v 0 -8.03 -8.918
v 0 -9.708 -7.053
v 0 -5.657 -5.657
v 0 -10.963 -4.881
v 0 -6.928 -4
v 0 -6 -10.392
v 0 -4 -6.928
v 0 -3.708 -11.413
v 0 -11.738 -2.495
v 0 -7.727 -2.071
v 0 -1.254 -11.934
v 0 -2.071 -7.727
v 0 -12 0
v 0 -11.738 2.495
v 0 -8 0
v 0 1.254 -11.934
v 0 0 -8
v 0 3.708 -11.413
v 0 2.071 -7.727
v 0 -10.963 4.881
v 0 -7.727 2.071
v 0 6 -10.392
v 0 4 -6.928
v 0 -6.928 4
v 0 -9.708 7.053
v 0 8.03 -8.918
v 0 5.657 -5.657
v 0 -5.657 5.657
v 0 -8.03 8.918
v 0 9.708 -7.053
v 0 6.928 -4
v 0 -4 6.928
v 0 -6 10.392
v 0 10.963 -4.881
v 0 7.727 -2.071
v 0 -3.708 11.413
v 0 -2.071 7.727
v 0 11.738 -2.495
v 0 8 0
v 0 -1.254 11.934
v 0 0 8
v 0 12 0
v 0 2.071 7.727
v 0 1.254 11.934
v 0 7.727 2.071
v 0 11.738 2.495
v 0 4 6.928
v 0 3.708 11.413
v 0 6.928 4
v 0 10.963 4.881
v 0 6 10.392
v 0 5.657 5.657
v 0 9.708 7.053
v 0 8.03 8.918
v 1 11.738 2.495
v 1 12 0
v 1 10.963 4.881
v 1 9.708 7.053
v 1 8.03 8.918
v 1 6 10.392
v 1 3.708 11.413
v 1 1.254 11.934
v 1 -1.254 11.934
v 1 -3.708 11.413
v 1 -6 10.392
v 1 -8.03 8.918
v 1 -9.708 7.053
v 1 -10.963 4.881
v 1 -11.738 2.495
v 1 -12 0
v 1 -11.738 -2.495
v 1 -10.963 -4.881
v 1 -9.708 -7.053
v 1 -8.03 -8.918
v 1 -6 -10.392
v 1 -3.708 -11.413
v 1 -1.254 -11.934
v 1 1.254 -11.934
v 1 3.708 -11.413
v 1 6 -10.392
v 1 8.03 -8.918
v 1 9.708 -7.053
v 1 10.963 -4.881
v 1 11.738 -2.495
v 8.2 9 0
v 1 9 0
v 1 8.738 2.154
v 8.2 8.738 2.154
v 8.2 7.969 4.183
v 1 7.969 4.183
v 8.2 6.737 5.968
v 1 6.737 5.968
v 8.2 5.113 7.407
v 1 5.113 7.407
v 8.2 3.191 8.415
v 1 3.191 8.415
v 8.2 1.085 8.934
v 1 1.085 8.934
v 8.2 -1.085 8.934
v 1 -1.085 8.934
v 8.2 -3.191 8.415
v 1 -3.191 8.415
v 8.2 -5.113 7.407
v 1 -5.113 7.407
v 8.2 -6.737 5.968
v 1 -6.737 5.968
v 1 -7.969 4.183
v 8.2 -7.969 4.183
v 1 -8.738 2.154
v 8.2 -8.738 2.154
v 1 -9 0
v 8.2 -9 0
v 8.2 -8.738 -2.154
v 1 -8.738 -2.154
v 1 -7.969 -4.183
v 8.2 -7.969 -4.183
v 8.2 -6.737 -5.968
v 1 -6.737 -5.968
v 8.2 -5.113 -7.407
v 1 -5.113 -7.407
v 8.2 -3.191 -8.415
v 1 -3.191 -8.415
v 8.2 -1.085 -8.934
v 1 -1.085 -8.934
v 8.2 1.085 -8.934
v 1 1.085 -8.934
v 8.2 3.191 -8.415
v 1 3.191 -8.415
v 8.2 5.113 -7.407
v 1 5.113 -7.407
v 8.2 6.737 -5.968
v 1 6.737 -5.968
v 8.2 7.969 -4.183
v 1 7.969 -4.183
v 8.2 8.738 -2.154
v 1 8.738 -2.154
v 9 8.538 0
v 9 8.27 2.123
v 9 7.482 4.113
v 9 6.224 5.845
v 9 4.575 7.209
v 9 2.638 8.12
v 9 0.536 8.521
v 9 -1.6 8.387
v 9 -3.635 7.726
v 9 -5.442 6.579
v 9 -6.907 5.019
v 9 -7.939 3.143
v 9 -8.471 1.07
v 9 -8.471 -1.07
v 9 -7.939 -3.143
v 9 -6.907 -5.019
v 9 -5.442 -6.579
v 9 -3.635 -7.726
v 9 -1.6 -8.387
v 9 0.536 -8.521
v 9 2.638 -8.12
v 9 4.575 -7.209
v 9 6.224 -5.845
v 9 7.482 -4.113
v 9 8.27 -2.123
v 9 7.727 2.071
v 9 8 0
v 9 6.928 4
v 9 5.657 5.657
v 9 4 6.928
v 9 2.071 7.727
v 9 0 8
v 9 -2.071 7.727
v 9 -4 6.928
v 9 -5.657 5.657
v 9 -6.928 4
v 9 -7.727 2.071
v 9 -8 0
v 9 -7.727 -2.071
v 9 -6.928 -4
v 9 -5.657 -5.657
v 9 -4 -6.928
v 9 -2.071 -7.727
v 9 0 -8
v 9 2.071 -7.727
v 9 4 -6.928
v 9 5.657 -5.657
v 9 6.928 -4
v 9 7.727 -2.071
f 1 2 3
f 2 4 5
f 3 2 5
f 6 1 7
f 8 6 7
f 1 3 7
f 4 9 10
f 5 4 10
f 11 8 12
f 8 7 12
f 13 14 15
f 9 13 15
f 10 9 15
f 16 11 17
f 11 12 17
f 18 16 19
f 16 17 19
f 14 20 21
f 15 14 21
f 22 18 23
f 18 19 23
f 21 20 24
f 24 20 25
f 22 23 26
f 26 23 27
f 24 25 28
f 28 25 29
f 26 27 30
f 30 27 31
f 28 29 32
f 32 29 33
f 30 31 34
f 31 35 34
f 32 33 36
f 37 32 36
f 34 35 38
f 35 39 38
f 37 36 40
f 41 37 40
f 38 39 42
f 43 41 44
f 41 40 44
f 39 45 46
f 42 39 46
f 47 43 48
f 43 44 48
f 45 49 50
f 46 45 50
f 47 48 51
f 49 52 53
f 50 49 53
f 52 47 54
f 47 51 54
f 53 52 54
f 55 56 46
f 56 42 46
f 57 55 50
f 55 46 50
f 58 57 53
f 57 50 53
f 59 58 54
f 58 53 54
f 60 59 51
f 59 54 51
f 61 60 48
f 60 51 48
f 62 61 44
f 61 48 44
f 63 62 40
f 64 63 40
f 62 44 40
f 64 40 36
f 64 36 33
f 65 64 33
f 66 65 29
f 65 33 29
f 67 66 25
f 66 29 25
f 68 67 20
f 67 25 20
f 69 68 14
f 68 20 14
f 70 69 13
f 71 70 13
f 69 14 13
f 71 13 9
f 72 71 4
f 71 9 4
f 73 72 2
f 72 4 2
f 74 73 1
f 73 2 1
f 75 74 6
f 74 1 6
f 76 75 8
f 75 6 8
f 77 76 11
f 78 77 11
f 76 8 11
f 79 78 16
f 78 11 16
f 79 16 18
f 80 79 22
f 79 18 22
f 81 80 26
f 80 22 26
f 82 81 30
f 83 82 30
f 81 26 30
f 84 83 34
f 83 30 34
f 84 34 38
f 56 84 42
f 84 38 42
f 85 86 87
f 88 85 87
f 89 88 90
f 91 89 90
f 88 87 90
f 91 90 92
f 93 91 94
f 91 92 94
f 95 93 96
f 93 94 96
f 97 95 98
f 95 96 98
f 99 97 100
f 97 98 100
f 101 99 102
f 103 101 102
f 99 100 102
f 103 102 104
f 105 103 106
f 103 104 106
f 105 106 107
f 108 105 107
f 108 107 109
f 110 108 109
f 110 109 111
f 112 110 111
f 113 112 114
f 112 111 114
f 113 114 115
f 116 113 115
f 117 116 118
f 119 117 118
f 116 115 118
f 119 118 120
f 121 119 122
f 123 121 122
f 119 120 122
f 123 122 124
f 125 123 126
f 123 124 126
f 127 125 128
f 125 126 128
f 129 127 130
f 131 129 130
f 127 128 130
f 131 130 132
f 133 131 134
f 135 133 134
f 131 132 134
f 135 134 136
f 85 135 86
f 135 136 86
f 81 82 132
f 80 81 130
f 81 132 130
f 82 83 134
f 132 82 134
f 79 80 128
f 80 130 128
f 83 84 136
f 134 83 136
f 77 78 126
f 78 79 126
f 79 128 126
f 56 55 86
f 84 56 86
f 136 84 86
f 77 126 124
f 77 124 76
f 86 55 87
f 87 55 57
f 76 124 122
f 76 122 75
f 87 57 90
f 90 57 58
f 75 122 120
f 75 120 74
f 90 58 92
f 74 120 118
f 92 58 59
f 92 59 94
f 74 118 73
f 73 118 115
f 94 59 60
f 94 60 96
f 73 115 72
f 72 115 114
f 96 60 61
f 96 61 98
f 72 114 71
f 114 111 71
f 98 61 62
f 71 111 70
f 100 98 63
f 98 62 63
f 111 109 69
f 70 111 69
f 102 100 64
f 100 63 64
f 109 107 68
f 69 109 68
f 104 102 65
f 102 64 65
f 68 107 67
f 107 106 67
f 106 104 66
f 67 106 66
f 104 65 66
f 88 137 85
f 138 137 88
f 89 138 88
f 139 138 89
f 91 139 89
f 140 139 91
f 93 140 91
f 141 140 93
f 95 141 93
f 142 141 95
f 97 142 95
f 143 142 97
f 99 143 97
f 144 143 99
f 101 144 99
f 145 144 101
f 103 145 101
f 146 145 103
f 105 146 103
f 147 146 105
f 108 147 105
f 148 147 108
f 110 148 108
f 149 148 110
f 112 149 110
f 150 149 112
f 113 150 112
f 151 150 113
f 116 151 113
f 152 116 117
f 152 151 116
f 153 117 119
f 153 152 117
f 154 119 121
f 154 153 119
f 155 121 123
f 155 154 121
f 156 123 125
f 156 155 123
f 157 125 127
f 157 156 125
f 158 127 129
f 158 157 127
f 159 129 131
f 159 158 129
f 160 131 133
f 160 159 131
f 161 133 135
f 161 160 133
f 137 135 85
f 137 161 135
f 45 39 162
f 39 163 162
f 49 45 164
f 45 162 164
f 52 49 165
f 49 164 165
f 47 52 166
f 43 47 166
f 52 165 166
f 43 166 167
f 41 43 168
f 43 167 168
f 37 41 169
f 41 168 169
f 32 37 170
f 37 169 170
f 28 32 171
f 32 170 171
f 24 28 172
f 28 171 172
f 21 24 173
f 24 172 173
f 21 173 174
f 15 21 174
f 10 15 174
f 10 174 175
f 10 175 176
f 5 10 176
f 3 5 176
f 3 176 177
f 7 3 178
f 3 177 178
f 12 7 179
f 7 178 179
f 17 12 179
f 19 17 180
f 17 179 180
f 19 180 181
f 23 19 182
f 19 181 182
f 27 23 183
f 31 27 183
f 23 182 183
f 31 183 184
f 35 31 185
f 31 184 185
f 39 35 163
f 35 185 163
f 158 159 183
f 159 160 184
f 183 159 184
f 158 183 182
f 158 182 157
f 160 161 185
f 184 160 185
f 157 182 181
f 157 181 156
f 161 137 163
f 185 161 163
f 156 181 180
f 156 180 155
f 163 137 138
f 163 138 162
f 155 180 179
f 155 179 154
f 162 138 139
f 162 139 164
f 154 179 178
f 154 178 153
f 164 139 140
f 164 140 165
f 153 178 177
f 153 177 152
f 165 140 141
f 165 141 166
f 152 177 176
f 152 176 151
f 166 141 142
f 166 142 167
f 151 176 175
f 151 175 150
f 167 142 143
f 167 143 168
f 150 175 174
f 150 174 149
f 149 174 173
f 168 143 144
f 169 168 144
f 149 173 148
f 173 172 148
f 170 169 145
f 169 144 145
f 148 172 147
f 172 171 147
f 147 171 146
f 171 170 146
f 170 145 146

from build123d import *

# Parameters (mm, degrees)
SFAZOWANIE1_SIZE  = 0.8
SFAZOWANIE1_SIZE2 = 0.461880215


with BuildPart() as part:
    # Szkic1 → Obrót1 (revolve)
    with BuildSketch(Plane.XY):
        Polygon((0, 8), (9, 8), (9, 9), (1, 9), (1, 12), (0, 12), align=None)
    revolve(axis=Axis((0, 0, 0), (1, 0, 0)))

    # Sfazowanie1
    sfazowanie1_edges = [part.edges().sort_by_distance(p)[0] for p in [
        (9, -9, 0),
    ]]
    sfazowanie1_side = [part.faces().sort_by_distance(p)[0] for p in [
        (5, -9, 0),
    ]]
    chamfer(sfazowanie1_edges, length=SFAZOWANIE1_SIZE, length2=SFAZOWANIE1_SIZE2, reference=sfazowanie1_side[0])


solid = part.part
